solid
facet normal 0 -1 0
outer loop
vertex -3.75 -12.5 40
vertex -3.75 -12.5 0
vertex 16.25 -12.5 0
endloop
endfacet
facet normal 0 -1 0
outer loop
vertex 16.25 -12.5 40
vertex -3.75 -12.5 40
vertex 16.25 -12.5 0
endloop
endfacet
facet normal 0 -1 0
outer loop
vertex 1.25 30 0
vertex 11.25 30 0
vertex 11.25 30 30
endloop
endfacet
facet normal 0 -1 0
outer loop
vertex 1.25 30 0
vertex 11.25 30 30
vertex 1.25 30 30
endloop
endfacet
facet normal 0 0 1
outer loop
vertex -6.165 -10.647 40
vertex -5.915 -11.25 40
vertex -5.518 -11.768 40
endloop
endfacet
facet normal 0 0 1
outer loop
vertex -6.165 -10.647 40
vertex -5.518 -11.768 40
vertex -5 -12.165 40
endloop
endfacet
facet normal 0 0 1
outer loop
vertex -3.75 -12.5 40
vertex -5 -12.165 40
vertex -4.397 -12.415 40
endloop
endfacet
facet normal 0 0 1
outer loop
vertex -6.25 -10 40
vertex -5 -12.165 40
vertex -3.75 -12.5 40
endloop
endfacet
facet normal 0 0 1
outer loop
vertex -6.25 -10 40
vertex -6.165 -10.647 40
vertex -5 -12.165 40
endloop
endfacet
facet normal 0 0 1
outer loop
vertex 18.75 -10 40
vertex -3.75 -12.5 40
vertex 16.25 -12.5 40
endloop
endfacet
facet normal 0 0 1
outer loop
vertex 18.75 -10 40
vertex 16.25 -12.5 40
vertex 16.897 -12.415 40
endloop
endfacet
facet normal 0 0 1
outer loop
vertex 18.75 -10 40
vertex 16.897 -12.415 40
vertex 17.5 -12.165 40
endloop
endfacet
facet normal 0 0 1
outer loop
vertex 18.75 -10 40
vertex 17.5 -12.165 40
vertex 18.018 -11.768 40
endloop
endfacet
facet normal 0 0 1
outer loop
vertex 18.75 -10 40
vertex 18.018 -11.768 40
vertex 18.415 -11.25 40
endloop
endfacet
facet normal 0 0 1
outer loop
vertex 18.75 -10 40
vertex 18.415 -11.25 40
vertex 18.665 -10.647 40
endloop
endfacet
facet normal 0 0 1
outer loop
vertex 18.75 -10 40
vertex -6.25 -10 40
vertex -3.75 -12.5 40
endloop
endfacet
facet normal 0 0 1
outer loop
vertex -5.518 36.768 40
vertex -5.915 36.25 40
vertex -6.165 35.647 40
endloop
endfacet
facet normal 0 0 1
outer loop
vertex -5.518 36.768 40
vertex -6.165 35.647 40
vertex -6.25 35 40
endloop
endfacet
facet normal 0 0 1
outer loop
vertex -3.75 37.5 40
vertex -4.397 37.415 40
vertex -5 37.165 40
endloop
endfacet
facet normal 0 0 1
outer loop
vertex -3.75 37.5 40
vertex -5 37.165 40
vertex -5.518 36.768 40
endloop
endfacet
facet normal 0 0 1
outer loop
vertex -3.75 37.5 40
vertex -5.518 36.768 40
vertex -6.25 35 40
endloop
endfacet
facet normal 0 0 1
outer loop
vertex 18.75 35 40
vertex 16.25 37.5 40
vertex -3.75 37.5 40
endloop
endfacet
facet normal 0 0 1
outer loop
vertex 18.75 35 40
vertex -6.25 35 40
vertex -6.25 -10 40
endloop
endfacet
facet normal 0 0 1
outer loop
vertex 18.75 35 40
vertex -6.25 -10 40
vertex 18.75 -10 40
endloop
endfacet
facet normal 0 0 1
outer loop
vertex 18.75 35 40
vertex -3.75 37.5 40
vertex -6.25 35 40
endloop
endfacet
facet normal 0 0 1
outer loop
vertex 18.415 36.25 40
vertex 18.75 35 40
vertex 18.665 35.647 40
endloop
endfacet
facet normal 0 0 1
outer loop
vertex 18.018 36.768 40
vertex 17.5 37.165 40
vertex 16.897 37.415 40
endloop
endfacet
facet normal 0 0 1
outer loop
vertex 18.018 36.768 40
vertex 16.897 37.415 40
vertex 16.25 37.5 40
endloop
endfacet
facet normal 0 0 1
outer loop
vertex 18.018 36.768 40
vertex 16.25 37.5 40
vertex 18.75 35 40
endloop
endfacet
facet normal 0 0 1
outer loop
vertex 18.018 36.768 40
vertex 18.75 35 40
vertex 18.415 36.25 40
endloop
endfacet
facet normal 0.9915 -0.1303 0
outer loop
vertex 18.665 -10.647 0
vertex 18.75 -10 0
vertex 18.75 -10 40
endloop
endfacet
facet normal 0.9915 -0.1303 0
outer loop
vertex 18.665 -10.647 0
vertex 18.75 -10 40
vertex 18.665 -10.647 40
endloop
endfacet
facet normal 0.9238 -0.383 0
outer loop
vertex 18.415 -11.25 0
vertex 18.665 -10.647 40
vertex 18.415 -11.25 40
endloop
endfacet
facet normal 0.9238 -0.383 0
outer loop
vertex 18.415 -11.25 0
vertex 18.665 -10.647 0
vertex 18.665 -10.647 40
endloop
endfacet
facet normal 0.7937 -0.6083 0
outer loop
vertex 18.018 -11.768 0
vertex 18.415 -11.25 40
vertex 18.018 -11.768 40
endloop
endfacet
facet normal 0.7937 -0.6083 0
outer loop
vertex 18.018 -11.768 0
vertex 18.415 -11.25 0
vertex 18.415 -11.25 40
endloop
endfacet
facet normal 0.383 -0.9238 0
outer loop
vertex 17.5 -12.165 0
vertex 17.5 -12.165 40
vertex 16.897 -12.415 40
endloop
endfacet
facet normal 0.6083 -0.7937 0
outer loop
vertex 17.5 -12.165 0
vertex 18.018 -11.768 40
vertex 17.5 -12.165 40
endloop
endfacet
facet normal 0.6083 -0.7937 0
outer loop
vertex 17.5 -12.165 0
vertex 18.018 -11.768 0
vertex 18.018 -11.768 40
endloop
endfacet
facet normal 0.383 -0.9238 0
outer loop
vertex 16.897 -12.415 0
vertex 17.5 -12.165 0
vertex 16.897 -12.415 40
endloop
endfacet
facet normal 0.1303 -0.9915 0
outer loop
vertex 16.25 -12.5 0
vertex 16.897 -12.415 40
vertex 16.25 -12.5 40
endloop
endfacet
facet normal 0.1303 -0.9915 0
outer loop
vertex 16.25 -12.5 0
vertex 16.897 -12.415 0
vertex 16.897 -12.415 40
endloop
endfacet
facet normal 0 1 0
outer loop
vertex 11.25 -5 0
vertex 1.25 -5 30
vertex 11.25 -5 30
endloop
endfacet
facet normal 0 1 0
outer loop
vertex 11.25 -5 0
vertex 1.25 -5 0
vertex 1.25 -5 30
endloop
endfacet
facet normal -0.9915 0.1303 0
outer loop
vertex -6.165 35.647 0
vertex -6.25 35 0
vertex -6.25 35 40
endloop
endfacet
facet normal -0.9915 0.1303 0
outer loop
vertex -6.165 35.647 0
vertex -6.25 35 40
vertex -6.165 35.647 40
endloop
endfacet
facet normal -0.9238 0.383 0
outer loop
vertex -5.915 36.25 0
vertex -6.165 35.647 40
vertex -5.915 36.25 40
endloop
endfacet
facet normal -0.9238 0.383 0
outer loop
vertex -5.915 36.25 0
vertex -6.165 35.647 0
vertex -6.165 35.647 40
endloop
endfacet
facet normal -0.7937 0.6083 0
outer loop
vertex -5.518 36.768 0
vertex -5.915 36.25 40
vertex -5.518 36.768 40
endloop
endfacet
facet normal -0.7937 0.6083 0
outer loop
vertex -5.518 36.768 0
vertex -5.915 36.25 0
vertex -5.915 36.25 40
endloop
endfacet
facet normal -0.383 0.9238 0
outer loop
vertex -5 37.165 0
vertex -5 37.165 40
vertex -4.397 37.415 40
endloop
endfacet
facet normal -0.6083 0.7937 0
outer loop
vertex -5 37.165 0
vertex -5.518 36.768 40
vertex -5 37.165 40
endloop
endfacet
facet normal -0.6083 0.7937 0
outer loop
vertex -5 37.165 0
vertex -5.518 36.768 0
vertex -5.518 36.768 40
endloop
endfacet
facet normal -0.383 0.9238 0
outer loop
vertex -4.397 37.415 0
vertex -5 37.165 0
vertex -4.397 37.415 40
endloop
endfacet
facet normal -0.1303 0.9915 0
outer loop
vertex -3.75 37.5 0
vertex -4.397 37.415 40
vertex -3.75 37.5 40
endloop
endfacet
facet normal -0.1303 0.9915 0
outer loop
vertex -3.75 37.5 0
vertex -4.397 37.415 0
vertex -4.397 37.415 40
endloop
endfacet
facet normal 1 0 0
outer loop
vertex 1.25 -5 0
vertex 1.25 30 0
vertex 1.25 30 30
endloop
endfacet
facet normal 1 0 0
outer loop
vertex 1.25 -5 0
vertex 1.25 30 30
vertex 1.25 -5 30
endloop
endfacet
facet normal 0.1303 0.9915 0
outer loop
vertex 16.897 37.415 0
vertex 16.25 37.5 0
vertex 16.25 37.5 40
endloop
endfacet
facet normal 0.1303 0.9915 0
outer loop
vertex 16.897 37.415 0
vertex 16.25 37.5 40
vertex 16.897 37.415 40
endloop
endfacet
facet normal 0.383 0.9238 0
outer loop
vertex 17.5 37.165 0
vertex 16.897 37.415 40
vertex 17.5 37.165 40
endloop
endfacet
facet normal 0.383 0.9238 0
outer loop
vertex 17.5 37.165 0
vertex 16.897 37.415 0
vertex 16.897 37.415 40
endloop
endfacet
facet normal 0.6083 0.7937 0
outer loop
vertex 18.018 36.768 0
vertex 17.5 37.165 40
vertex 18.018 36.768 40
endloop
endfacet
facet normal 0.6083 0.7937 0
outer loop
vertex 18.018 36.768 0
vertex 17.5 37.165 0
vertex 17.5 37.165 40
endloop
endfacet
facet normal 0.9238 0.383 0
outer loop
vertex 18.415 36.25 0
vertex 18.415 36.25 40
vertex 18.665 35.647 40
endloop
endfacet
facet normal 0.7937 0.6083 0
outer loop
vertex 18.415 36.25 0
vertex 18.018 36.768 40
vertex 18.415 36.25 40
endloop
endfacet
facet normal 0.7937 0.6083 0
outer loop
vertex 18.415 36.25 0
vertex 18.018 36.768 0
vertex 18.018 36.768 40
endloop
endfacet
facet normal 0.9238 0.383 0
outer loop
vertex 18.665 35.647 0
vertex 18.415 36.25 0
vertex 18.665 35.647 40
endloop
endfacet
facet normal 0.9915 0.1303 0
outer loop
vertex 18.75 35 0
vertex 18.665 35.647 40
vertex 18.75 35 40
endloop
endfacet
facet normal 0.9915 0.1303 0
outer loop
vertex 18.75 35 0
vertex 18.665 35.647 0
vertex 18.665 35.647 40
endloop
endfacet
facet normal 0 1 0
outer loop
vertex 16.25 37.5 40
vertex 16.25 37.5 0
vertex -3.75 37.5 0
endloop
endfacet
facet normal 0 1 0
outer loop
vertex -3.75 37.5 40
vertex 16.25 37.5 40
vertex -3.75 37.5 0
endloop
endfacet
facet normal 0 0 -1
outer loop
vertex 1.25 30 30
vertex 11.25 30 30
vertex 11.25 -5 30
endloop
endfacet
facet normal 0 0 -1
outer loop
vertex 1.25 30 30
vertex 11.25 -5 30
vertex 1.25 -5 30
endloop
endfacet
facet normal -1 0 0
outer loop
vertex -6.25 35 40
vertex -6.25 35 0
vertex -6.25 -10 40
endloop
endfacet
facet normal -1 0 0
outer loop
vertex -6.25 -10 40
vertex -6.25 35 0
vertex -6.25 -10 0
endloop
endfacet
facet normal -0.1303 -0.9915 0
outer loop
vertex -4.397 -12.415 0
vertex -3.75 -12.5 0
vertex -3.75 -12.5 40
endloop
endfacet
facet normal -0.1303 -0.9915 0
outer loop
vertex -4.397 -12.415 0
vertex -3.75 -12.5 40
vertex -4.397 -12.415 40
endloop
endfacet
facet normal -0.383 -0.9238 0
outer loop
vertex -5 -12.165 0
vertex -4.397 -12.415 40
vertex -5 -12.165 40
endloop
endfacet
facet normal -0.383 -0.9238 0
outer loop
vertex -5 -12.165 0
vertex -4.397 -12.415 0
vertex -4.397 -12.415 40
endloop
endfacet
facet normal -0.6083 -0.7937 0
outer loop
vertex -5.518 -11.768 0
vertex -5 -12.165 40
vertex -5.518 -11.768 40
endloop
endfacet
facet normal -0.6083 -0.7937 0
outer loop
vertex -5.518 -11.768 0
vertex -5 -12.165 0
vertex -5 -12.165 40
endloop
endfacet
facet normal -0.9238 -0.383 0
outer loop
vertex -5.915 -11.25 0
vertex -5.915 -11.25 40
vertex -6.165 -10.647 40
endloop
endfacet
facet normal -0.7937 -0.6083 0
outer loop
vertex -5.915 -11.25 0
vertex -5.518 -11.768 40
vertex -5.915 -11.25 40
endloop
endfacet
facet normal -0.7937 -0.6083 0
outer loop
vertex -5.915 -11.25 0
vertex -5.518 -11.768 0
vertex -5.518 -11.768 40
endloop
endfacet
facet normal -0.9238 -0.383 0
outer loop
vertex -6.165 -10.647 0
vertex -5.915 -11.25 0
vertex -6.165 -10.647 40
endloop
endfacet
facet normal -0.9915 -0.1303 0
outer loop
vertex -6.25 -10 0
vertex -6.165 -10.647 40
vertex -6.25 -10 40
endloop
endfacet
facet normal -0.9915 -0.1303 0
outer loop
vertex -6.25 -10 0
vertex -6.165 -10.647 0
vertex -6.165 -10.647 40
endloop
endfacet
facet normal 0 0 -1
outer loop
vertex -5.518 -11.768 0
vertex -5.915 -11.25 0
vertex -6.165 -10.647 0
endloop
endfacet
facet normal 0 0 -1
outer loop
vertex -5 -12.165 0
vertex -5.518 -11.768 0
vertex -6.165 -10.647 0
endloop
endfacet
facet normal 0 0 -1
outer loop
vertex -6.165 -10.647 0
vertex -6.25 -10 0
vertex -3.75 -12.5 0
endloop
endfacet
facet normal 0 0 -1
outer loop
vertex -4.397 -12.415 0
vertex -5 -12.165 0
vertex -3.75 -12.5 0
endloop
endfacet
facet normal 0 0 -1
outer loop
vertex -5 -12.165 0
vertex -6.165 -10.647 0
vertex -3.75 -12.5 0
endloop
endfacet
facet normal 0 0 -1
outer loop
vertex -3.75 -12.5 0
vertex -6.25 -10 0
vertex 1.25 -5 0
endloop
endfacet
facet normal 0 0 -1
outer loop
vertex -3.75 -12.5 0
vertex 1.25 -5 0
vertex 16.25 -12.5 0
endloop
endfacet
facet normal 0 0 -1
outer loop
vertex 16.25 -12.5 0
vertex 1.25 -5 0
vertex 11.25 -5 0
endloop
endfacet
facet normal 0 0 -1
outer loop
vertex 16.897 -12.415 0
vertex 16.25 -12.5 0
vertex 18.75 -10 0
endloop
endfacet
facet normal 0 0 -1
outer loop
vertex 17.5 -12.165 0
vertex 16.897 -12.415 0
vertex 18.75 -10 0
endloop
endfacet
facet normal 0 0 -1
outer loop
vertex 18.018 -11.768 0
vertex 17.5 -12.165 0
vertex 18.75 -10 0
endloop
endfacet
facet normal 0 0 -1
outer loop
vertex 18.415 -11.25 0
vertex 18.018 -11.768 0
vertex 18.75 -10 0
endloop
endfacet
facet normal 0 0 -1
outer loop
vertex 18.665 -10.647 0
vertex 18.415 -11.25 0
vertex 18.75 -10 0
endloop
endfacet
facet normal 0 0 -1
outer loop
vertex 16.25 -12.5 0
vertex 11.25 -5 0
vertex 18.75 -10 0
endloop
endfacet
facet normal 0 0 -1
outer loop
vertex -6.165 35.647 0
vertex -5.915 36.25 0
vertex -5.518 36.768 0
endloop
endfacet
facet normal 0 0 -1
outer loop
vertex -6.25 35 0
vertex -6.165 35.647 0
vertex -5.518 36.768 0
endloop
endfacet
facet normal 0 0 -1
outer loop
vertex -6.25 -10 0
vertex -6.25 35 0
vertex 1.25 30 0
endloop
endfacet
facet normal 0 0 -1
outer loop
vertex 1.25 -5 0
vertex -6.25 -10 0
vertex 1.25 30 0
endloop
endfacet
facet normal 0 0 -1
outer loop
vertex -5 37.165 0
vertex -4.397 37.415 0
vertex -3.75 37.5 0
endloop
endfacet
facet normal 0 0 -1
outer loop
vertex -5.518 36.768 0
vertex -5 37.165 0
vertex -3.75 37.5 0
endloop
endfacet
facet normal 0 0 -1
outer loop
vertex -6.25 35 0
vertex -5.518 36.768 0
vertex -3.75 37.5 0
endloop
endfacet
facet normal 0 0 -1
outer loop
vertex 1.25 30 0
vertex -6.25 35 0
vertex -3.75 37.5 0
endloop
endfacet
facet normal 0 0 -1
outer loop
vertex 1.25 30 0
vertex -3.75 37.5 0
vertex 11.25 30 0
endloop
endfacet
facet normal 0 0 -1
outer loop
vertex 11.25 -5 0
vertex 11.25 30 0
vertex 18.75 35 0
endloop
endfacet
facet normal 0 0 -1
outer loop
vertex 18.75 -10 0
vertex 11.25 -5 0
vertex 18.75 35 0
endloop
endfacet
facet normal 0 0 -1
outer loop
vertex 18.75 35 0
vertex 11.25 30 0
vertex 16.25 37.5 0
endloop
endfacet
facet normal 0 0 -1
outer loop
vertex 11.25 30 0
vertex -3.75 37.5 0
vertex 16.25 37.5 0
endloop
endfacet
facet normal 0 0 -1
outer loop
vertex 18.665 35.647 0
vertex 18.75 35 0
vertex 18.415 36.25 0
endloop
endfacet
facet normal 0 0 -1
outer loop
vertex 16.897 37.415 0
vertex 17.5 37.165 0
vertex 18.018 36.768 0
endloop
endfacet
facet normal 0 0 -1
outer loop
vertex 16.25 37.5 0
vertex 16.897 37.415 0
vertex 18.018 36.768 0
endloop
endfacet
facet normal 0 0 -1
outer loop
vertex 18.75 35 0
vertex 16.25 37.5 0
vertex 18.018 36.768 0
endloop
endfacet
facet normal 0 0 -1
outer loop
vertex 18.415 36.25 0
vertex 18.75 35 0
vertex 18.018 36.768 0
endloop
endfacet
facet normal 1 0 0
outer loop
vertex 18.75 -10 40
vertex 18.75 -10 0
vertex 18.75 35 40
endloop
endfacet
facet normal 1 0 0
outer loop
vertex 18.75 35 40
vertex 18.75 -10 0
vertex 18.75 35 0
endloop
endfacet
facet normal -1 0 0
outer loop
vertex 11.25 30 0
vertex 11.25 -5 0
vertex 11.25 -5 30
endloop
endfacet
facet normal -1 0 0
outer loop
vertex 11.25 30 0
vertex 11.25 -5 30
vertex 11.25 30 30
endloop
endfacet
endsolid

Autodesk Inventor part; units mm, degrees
ref_plane "YZ Plane" through (0, 0, 0) normal (1, 0, 0) x (0, 1, 0)
ref_plane "XZ Plane" through (0, 0, 0) normal (0, 1, 0) x (-1, 0, 0)
ref_plane "XY Plane" through (0, 0, 0) normal (0, 0, 1) x (1, 0, 0)
sketch "Sketch1" plane through (0, 0, 0) normal (0, 0, 1) x (1, 0, 0)
  line L0 (11.25, -5) -> (1.25, -5) projected
  line L1 (1.25, -5) -> (1.25, 30) projected
  line L2 (1.25, 30) -> (11.25, 30) projected
  line L3 (11.25, 30) -> (11.25, -5) projected
  arc A0 (16.25, -12.5) -> (18.75, -10) centre (16.25, -10) ccw projected
  line L4 (18.75, -10) -> (18.75, 35) projected
  arc A1 (18.75, 35) -> (16.25, 37.5) centre (16.25, 35) ccw projected
  line L5 (16.25, 37.5) -> (-3.75, 37.5) projected
  arc A2 (-3.75, 37.5) -> (-6.25, 35) centre (-3.75, 35) ccw projected
  line L6 (-6.25, 35) -> (-6.25, -10) projected
  arc A3 (-6.25, -10) -> (-3.75, -12.5) centre (-3.75, -10) ccw projected
  line L7 (-3.75, -12.5) -> (16.25, -12.5) projected
  line L8 (-6.25, -10) -> (-6.25, 35)
  arc A4 (-3.75, 37.5) -> (-6.25, 35) centre (-3.75, 35) ccw
  line L9 (-3.75, 37.5) -> (16.25, 37.5)
  arc A5 (18.75, 35) -> (16.25, 37.5) centre (16.25, 35) ccw
  line L10 (18.75, 35) -> (18.75, -10)
  arc A6 (16.25, -12.5) -> (18.75, -10) centre (16.25, -10) ccw
  line L11 (16.25, -12.5) -> (-3.75, -12.5)
  arc A7 (-6.25, -10) -> (-3.75, -12.5) centre (-3.75, -10) ccw
  point P0 (0, 0)
  dimension "d0" = 0
extrude "Extrusion1" add sketch "Sketch1" along normal blind 40 contours L0 L1 L2 L3 | L7 A3 L6 A2 L5 A1 L4 A0
sketch "Sketch2" plane through (0, 0, 0) normal (0, 0, -1) x (-1, 0, 0)
  line L0 (-16.25, -10) -> (-16.25, 35) projected
  line L1 (3.75, -10) -> (-16.25, -10) projected
  line L2 (3.75, 35) -> (3.75, -10) projected
  line L3 (-16.25, 35) -> (3.75, 35) projected
  line L4 (-11.25, -5) -> (-11.25, 30) projected
  line L5 (-11.25, 30) -> (-1.25, 30) projected
  line L6 (-1.25, 30) -> (-1.25, -5) projected
  line L7 (-1.25, -5) -> (-11.25, -5) projected
  line L8 (-2.75, 28.5) -> (-9.75, 28.5) projected
  line L9 (-9.75, 28.5) -> (-9.75, -3.5) projected
  line L10 (-9.75, -3.5) -> (-2.75, -3.5) projected
  line L11 (-2.75, -3.5) -> (-2.75, 28.5) projected
  line L12 (-1.25, -5) -> (-11.25, -5)
  line L13 (-11.25, -5) -> (-11.25, 30)
  line L14 (-11.25, 30) -> (-1.25, 30)
  line L15 (-1.25, 30) -> (-1.25, -5)
  point P0 (0, 0)
extrude "Extrusion2" cut sketch "Sketch2" against normal blind 30 contours L4 L5 L6 L7 | L11 L10 L9 L8
properties part number "USB_Cap"
